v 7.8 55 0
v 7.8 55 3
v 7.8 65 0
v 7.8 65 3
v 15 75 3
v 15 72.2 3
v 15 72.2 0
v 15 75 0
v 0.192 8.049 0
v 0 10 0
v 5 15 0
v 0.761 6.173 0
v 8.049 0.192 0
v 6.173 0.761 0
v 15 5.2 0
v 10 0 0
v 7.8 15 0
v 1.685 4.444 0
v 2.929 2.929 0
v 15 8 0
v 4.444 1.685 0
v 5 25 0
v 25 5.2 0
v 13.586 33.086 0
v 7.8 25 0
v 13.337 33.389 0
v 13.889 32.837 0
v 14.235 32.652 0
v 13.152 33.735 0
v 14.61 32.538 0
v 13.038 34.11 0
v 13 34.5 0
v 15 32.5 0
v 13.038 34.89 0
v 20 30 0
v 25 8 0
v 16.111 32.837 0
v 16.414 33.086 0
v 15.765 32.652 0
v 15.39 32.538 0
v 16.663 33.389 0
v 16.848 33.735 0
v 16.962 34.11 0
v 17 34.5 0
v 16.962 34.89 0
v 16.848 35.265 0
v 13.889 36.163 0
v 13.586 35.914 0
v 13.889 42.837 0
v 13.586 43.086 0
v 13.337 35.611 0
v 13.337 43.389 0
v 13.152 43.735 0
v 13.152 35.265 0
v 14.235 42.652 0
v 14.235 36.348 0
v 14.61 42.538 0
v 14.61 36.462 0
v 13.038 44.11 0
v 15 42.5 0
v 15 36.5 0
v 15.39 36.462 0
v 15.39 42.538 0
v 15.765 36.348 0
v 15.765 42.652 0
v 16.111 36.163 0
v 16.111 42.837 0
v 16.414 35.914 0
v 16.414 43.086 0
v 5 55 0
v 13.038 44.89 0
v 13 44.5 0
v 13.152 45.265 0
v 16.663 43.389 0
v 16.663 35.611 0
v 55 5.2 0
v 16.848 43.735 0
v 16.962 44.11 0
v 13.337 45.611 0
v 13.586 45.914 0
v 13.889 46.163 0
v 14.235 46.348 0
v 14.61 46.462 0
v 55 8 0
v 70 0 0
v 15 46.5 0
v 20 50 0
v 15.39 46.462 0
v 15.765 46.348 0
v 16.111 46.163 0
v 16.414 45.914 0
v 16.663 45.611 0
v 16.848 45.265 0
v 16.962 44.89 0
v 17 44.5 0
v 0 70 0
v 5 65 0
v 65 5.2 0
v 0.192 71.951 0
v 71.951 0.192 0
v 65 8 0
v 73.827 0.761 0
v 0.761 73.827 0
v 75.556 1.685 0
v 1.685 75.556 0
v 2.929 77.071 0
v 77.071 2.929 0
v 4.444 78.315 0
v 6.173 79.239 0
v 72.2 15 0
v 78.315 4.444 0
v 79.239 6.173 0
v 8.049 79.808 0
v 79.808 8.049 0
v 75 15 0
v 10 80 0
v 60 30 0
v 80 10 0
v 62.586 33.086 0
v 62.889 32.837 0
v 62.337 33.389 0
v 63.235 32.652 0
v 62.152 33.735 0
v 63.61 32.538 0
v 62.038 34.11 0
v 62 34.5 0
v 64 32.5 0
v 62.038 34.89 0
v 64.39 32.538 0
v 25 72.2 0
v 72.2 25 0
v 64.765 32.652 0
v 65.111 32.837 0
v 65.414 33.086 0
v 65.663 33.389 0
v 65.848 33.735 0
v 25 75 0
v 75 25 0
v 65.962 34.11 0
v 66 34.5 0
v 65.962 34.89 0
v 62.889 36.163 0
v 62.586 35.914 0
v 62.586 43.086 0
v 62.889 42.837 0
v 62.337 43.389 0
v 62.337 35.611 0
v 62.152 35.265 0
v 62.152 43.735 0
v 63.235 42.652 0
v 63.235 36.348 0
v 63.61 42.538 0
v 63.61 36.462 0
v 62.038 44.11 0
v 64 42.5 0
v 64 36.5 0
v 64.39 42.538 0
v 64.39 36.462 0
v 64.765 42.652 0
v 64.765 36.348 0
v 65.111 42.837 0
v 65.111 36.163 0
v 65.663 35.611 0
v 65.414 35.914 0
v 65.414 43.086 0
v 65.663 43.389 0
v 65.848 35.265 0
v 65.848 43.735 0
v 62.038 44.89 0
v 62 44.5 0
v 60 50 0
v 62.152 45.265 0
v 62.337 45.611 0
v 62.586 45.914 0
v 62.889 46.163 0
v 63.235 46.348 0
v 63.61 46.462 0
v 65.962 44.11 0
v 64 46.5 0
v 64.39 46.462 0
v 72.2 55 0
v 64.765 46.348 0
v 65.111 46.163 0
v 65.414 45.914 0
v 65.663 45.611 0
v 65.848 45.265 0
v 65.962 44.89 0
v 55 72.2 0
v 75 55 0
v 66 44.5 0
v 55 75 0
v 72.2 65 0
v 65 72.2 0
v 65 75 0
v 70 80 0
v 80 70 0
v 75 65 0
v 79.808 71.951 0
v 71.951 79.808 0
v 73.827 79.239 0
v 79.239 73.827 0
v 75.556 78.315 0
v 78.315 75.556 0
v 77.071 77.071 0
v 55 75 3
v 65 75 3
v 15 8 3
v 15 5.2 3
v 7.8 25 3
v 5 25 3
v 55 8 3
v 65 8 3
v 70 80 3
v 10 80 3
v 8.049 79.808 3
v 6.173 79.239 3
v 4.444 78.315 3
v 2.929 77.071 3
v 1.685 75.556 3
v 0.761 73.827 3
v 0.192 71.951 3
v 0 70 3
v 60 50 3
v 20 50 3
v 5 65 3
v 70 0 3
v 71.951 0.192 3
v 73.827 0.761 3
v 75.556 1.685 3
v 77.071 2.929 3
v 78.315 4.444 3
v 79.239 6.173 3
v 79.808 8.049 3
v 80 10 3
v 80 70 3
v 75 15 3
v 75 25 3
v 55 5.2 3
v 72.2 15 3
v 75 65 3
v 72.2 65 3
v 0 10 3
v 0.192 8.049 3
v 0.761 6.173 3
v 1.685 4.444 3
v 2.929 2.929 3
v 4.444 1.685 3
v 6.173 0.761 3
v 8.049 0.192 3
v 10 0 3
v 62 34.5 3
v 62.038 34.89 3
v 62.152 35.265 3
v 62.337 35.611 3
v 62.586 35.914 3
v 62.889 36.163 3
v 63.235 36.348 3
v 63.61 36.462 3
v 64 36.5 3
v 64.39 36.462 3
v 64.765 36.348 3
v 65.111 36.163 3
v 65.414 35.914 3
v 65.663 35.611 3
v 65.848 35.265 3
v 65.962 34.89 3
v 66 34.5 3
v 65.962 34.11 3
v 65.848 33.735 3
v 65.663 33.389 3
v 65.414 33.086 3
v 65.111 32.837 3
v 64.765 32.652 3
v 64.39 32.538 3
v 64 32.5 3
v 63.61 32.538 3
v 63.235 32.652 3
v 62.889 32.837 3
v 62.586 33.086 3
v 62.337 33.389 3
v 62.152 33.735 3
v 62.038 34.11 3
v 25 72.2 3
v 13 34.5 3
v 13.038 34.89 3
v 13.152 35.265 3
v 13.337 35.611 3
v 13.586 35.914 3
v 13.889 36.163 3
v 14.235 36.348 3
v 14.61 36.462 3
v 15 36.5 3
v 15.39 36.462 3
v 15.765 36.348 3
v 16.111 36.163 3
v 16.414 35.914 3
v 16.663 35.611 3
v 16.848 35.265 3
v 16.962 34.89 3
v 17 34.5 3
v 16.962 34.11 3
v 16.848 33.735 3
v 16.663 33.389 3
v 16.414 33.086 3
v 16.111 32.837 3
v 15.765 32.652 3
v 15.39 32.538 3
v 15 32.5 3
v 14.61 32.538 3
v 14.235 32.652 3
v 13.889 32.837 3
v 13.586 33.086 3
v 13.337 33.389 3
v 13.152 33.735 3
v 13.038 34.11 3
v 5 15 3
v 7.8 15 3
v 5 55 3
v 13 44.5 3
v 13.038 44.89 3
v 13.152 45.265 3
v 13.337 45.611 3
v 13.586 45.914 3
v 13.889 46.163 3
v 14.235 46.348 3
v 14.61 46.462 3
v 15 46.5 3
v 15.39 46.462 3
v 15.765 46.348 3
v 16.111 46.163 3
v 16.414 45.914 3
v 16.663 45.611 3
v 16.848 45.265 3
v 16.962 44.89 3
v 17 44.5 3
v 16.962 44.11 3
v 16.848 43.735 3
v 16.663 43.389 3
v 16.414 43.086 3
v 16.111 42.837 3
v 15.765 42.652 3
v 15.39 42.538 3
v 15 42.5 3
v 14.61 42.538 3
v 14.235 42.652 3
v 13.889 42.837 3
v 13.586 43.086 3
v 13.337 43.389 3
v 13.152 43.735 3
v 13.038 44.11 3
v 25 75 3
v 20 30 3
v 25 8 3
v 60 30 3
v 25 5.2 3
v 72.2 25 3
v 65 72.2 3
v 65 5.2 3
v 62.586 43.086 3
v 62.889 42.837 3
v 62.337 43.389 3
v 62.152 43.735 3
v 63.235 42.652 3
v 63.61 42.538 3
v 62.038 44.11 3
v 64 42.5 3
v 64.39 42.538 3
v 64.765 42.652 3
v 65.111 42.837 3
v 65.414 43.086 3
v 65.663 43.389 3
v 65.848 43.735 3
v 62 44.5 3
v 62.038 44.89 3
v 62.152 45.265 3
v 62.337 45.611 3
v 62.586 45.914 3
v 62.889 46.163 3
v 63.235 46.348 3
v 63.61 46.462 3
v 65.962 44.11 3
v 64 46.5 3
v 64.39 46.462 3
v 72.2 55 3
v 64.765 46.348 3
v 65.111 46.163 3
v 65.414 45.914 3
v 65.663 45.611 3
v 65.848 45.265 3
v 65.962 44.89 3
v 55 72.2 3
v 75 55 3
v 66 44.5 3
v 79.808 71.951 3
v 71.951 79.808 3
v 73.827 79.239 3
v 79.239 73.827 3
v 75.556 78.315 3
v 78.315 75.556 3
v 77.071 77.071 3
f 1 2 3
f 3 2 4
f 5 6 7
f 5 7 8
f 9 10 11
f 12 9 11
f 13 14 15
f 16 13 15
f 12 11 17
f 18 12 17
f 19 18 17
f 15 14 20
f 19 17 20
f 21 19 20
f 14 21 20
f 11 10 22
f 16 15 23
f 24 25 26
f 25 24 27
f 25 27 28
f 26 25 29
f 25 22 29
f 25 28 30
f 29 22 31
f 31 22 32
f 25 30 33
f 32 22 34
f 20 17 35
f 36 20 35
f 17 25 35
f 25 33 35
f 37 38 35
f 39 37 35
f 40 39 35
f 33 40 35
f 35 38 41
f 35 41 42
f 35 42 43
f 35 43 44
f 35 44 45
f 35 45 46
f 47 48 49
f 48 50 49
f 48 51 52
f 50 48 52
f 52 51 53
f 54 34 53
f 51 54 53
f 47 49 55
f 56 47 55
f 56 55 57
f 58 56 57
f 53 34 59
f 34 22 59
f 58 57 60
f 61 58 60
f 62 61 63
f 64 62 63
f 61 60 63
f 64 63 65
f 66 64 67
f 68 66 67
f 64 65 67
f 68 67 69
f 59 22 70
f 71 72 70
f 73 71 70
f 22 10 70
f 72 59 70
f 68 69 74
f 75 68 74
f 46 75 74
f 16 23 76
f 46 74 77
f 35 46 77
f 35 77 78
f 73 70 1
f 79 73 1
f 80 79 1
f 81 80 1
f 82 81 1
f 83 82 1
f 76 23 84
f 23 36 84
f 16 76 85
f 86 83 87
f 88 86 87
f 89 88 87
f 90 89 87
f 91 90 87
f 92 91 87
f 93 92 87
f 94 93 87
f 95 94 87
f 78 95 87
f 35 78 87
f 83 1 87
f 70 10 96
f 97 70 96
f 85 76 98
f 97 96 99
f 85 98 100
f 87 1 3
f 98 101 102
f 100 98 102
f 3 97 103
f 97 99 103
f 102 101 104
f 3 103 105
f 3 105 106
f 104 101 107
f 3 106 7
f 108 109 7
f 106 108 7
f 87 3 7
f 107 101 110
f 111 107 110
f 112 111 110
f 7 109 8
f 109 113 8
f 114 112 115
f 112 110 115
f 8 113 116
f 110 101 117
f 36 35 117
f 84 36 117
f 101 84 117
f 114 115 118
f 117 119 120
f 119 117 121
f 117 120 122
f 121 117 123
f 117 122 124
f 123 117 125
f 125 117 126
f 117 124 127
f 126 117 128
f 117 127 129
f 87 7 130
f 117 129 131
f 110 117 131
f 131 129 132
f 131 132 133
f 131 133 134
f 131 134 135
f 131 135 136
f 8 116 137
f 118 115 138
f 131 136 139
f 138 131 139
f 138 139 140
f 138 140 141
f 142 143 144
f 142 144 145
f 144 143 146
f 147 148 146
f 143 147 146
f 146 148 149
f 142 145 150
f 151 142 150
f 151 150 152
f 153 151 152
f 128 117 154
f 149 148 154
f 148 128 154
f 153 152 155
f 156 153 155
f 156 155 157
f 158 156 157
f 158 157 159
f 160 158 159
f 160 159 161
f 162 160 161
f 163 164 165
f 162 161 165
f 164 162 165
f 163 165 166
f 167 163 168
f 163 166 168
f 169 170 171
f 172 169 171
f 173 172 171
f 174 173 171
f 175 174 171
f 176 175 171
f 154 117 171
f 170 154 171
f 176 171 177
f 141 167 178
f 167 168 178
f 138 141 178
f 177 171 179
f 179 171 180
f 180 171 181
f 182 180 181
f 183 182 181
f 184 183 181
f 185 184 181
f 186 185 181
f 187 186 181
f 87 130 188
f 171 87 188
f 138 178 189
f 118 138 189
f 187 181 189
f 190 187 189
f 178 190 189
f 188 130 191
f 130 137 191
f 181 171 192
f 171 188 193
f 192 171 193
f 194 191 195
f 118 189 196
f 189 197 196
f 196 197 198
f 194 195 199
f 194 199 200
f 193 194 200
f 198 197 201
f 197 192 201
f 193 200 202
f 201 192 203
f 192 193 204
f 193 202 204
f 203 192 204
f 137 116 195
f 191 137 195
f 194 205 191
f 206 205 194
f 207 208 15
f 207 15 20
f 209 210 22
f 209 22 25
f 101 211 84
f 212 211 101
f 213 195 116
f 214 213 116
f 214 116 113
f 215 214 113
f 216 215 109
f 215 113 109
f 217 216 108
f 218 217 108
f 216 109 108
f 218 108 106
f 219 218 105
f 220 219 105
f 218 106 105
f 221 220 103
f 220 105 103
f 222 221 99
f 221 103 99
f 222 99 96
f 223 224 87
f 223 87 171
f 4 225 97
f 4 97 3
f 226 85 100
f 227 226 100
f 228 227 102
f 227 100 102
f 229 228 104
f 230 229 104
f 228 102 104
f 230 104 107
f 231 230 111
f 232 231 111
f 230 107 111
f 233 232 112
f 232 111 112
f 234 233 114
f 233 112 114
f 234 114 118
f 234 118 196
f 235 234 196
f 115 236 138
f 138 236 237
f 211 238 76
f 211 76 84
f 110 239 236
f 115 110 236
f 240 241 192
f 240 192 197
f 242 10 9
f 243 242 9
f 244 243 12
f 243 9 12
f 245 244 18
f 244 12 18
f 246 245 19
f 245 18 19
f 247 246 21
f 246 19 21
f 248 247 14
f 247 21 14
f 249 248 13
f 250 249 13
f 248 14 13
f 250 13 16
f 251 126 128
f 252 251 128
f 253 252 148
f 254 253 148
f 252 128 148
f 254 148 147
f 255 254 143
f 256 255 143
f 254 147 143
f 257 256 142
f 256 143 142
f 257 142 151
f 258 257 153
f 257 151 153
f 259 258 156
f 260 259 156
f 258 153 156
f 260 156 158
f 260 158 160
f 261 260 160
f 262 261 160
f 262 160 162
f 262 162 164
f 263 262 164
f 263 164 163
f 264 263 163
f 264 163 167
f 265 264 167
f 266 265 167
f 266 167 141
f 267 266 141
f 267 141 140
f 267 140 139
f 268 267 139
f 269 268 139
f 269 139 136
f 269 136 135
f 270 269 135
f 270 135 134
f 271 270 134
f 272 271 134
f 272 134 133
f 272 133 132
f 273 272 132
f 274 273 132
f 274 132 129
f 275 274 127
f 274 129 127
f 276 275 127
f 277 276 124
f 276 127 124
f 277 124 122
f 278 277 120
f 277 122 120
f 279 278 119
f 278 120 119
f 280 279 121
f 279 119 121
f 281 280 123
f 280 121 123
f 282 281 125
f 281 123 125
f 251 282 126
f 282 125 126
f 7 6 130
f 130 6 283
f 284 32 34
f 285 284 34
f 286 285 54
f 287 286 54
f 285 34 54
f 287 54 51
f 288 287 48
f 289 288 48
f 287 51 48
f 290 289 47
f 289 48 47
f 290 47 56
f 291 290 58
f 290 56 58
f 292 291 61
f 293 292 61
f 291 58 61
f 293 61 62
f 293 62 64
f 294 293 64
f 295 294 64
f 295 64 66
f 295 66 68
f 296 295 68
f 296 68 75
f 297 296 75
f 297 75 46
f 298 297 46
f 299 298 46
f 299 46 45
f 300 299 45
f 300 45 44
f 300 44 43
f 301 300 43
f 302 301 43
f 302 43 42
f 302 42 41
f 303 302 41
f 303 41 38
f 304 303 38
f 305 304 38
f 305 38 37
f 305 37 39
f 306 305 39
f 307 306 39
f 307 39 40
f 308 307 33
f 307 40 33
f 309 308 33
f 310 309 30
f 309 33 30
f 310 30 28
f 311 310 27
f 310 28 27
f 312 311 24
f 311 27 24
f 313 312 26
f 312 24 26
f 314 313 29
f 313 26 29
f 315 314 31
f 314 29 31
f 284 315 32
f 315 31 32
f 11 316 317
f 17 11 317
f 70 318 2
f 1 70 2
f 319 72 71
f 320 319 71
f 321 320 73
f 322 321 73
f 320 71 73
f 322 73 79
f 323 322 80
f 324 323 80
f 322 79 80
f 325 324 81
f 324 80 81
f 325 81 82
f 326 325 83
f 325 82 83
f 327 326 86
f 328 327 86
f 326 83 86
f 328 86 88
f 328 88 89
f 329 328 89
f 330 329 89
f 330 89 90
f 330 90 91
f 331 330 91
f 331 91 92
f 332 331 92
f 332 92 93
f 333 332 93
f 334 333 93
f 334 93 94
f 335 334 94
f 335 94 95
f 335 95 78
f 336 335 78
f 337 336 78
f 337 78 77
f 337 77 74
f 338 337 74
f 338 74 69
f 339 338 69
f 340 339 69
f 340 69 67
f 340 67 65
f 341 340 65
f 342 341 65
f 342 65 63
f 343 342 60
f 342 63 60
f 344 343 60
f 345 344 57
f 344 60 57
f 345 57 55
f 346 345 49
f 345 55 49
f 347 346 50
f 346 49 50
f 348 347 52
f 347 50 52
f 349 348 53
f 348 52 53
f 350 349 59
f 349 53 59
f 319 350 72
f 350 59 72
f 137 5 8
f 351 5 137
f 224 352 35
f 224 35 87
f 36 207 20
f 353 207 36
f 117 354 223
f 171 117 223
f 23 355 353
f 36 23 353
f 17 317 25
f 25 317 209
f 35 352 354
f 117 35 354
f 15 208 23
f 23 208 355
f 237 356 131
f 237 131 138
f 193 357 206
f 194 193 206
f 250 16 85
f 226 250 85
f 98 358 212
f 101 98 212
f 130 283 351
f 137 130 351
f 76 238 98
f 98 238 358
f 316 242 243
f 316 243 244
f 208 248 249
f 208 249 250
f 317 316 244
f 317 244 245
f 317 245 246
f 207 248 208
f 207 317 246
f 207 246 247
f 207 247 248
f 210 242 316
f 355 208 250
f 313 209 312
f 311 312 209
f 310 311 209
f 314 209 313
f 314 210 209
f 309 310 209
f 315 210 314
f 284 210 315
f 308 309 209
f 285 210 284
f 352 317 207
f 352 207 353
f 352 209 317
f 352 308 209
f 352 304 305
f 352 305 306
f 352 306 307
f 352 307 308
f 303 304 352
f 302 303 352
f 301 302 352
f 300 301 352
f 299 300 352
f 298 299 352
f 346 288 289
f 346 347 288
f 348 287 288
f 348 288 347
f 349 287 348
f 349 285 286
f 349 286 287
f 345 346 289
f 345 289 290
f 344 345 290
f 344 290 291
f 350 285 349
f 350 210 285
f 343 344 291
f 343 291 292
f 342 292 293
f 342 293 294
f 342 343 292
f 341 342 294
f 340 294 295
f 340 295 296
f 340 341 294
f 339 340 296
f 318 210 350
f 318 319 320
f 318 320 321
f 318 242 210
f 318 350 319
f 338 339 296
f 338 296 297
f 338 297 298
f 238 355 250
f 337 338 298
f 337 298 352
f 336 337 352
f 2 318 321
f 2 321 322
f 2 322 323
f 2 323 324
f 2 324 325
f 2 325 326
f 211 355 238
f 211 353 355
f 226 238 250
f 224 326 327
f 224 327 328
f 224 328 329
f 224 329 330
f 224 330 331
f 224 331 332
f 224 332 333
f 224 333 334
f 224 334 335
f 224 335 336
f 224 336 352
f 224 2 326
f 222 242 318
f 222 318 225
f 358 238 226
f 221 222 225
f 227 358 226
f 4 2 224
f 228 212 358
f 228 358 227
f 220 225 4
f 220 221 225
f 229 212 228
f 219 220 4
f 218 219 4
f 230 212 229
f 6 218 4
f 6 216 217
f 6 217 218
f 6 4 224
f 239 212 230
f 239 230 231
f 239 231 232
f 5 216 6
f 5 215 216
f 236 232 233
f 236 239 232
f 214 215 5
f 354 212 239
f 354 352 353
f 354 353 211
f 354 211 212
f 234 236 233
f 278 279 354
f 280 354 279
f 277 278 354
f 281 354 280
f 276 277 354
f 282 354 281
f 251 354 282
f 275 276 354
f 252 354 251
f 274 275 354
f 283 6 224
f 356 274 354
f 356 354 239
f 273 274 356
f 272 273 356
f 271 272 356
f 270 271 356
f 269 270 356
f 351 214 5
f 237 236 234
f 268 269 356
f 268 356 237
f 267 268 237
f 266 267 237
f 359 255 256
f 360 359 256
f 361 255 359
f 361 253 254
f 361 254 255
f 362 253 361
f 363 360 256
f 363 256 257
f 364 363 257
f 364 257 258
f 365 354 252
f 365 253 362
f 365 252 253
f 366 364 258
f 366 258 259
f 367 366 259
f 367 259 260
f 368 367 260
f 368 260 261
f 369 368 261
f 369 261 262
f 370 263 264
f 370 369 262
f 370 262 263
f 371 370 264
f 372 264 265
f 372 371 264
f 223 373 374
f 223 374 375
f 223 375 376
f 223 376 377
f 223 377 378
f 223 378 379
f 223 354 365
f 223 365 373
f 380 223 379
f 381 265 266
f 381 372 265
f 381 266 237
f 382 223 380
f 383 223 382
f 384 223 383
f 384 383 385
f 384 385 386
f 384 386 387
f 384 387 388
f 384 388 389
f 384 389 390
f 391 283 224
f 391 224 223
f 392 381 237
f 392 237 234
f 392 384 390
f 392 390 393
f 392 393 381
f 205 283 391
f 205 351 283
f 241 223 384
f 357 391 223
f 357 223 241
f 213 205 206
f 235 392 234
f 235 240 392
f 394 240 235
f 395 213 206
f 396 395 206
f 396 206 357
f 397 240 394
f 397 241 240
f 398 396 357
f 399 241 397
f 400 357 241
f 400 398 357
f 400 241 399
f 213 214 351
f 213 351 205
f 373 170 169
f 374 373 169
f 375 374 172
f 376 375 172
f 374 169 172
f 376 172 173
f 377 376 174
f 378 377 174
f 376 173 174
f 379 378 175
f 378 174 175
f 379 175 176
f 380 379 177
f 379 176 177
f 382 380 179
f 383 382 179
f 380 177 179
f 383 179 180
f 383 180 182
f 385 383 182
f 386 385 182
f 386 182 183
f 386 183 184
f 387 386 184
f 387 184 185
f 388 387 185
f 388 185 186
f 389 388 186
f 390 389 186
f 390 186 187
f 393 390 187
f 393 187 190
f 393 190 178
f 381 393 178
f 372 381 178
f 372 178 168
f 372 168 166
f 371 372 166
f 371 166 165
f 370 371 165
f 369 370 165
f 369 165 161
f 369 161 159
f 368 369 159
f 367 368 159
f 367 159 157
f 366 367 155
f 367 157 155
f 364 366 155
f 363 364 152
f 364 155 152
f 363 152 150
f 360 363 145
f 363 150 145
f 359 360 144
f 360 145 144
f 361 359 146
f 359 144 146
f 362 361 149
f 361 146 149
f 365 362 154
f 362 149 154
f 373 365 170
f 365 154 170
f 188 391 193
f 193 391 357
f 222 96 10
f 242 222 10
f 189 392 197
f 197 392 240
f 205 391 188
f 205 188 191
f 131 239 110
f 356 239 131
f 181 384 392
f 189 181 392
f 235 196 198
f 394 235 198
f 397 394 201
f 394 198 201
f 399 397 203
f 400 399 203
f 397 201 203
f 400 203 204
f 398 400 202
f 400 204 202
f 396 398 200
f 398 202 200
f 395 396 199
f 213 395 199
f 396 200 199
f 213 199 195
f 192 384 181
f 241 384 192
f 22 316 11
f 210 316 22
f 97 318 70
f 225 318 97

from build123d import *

# Parameters (mm, degrees)
BOSS_EXTRU_1_DEPTH      = 3
ESQUISSE4_W             = 10
ESQUISSE4_H             = 2.8
ENL_V_MAT_EXTRU_2_DEPTH = 114.176852757
ESQUISSE5_W             = 2.8
ESQUISSE5_H             = 10
ENL_V_MAT_EXTRU_3_DEPTH = 114.176852757
ESQUISSE6_W             = 40
ESQUISSE6_H             = 20
ENL_V_MAT_EXTRU_4_DEPTH = 114.176852757
ESQUISSE7_R             = 2
ENL_V_MAT_EXTRU_5_DEPTH = 114.176852757


with BuildPart() as part:
    # Esquisse2 → Boss.-Extru.1 (new body)
    with BuildSketch(Plane.XY):
        with BuildLine():
            Line((10, 0), (70, 0))
            ThreePointArc((70, 0), (77.071067812, 2.928932188), (80, 10))
            Line((80, 10), (80, 70))
            ThreePointArc((80, 70), (77.071067812, 77.071067812), (70, 80))
            Line((70, 80), (10, 80))
            ThreePointArc((10, 80), (2.928932188, 77.071067812), (0, 70))
            Line((0, 70), (0, 10))
            ThreePointArc((0, 10), (2.928932188, 2.928932188), (10, 0))
        make_face()
    extrude(amount=BOSS_EXTRU_1_DEPTH)

    # Esquisse4 → Enlèv. mat.-Extru.2 (cut, through all)
    with BuildSketch(Plane.XY.offset(3)):
        with Locations((60, 73.6)):
            Rectangle(ESQUISSE4_W, ESQUISSE4_H)
        with Locations((20, 73.6)):
            Rectangle(ESQUISSE4_W, ESQUISSE4_H)
        with Locations((20, 6.6)):
            Rectangle(ESQUISSE4_W, ESQUISSE4_H)
        with Locations((60, 6.6)):
            Rectangle(ESQUISSE4_W, ESQUISSE4_H)
    extrude(amount=-ENL_V_MAT_EXTRU_2_DEPTH, mode=Mode.SUBTRACT)

    # Esquisse5 → Enlèv. mat.-Extru.3 (cut, through all)
    with BuildSketch(Plane.XY.offset(3)):
        with Locations((73.6, 60)):
            Rectangle(ESQUISSE5_W, ESQUISSE5_H)
        with Locations((6.4, 60)):
            Rectangle(ESQUISSE5_W, ESQUISSE5_H)
        with Locations((6.4, 20)):
            Rectangle(ESQUISSE5_W, ESQUISSE5_H)
        with Locations((73.6, 20)):
            Rectangle(ESQUISSE5_W, ESQUISSE5_H)
    extrude(amount=-ENL_V_MAT_EXTRU_3_DEPTH, mode=Mode.SUBTRACT)

    # Esquisse6 → Enlèv. mat.-Extru.4 (cut, through all)
    with BuildSketch(Plane.XY.offset(3)):
        with Locations((40, 40)):
            Rectangle(ESQUISSE6_W, ESQUISSE6_H)
    extrude(amount=-ENL_V_MAT_EXTRU_4_DEPTH, mode=Mode.SUBTRACT)

    # Esquisse7 → Enlèv. mat.-Extru.5 (cut, through all)
    with BuildSketch(Plane(origin=(0, 0, 0), x_dir=(-1, 0, 0), z_dir=(0, 0, -1))):
        with Locations((-15, 34.5)):
            Circle(ESQUISSE7_R)
        with Locations((-15, 44.5)):
            Circle(ESQUISSE7_R)
        with Locations((-64, 34.5)):
            Circle(ESQUISSE7_R)
        with Locations((-64, 44.5)):
            Circle(ESQUISSE7_R)
    extrude(amount=-ENL_V_MAT_EXTRU_5_DEPTH, mode=Mode.SUBTRACT)


solid = part.part
